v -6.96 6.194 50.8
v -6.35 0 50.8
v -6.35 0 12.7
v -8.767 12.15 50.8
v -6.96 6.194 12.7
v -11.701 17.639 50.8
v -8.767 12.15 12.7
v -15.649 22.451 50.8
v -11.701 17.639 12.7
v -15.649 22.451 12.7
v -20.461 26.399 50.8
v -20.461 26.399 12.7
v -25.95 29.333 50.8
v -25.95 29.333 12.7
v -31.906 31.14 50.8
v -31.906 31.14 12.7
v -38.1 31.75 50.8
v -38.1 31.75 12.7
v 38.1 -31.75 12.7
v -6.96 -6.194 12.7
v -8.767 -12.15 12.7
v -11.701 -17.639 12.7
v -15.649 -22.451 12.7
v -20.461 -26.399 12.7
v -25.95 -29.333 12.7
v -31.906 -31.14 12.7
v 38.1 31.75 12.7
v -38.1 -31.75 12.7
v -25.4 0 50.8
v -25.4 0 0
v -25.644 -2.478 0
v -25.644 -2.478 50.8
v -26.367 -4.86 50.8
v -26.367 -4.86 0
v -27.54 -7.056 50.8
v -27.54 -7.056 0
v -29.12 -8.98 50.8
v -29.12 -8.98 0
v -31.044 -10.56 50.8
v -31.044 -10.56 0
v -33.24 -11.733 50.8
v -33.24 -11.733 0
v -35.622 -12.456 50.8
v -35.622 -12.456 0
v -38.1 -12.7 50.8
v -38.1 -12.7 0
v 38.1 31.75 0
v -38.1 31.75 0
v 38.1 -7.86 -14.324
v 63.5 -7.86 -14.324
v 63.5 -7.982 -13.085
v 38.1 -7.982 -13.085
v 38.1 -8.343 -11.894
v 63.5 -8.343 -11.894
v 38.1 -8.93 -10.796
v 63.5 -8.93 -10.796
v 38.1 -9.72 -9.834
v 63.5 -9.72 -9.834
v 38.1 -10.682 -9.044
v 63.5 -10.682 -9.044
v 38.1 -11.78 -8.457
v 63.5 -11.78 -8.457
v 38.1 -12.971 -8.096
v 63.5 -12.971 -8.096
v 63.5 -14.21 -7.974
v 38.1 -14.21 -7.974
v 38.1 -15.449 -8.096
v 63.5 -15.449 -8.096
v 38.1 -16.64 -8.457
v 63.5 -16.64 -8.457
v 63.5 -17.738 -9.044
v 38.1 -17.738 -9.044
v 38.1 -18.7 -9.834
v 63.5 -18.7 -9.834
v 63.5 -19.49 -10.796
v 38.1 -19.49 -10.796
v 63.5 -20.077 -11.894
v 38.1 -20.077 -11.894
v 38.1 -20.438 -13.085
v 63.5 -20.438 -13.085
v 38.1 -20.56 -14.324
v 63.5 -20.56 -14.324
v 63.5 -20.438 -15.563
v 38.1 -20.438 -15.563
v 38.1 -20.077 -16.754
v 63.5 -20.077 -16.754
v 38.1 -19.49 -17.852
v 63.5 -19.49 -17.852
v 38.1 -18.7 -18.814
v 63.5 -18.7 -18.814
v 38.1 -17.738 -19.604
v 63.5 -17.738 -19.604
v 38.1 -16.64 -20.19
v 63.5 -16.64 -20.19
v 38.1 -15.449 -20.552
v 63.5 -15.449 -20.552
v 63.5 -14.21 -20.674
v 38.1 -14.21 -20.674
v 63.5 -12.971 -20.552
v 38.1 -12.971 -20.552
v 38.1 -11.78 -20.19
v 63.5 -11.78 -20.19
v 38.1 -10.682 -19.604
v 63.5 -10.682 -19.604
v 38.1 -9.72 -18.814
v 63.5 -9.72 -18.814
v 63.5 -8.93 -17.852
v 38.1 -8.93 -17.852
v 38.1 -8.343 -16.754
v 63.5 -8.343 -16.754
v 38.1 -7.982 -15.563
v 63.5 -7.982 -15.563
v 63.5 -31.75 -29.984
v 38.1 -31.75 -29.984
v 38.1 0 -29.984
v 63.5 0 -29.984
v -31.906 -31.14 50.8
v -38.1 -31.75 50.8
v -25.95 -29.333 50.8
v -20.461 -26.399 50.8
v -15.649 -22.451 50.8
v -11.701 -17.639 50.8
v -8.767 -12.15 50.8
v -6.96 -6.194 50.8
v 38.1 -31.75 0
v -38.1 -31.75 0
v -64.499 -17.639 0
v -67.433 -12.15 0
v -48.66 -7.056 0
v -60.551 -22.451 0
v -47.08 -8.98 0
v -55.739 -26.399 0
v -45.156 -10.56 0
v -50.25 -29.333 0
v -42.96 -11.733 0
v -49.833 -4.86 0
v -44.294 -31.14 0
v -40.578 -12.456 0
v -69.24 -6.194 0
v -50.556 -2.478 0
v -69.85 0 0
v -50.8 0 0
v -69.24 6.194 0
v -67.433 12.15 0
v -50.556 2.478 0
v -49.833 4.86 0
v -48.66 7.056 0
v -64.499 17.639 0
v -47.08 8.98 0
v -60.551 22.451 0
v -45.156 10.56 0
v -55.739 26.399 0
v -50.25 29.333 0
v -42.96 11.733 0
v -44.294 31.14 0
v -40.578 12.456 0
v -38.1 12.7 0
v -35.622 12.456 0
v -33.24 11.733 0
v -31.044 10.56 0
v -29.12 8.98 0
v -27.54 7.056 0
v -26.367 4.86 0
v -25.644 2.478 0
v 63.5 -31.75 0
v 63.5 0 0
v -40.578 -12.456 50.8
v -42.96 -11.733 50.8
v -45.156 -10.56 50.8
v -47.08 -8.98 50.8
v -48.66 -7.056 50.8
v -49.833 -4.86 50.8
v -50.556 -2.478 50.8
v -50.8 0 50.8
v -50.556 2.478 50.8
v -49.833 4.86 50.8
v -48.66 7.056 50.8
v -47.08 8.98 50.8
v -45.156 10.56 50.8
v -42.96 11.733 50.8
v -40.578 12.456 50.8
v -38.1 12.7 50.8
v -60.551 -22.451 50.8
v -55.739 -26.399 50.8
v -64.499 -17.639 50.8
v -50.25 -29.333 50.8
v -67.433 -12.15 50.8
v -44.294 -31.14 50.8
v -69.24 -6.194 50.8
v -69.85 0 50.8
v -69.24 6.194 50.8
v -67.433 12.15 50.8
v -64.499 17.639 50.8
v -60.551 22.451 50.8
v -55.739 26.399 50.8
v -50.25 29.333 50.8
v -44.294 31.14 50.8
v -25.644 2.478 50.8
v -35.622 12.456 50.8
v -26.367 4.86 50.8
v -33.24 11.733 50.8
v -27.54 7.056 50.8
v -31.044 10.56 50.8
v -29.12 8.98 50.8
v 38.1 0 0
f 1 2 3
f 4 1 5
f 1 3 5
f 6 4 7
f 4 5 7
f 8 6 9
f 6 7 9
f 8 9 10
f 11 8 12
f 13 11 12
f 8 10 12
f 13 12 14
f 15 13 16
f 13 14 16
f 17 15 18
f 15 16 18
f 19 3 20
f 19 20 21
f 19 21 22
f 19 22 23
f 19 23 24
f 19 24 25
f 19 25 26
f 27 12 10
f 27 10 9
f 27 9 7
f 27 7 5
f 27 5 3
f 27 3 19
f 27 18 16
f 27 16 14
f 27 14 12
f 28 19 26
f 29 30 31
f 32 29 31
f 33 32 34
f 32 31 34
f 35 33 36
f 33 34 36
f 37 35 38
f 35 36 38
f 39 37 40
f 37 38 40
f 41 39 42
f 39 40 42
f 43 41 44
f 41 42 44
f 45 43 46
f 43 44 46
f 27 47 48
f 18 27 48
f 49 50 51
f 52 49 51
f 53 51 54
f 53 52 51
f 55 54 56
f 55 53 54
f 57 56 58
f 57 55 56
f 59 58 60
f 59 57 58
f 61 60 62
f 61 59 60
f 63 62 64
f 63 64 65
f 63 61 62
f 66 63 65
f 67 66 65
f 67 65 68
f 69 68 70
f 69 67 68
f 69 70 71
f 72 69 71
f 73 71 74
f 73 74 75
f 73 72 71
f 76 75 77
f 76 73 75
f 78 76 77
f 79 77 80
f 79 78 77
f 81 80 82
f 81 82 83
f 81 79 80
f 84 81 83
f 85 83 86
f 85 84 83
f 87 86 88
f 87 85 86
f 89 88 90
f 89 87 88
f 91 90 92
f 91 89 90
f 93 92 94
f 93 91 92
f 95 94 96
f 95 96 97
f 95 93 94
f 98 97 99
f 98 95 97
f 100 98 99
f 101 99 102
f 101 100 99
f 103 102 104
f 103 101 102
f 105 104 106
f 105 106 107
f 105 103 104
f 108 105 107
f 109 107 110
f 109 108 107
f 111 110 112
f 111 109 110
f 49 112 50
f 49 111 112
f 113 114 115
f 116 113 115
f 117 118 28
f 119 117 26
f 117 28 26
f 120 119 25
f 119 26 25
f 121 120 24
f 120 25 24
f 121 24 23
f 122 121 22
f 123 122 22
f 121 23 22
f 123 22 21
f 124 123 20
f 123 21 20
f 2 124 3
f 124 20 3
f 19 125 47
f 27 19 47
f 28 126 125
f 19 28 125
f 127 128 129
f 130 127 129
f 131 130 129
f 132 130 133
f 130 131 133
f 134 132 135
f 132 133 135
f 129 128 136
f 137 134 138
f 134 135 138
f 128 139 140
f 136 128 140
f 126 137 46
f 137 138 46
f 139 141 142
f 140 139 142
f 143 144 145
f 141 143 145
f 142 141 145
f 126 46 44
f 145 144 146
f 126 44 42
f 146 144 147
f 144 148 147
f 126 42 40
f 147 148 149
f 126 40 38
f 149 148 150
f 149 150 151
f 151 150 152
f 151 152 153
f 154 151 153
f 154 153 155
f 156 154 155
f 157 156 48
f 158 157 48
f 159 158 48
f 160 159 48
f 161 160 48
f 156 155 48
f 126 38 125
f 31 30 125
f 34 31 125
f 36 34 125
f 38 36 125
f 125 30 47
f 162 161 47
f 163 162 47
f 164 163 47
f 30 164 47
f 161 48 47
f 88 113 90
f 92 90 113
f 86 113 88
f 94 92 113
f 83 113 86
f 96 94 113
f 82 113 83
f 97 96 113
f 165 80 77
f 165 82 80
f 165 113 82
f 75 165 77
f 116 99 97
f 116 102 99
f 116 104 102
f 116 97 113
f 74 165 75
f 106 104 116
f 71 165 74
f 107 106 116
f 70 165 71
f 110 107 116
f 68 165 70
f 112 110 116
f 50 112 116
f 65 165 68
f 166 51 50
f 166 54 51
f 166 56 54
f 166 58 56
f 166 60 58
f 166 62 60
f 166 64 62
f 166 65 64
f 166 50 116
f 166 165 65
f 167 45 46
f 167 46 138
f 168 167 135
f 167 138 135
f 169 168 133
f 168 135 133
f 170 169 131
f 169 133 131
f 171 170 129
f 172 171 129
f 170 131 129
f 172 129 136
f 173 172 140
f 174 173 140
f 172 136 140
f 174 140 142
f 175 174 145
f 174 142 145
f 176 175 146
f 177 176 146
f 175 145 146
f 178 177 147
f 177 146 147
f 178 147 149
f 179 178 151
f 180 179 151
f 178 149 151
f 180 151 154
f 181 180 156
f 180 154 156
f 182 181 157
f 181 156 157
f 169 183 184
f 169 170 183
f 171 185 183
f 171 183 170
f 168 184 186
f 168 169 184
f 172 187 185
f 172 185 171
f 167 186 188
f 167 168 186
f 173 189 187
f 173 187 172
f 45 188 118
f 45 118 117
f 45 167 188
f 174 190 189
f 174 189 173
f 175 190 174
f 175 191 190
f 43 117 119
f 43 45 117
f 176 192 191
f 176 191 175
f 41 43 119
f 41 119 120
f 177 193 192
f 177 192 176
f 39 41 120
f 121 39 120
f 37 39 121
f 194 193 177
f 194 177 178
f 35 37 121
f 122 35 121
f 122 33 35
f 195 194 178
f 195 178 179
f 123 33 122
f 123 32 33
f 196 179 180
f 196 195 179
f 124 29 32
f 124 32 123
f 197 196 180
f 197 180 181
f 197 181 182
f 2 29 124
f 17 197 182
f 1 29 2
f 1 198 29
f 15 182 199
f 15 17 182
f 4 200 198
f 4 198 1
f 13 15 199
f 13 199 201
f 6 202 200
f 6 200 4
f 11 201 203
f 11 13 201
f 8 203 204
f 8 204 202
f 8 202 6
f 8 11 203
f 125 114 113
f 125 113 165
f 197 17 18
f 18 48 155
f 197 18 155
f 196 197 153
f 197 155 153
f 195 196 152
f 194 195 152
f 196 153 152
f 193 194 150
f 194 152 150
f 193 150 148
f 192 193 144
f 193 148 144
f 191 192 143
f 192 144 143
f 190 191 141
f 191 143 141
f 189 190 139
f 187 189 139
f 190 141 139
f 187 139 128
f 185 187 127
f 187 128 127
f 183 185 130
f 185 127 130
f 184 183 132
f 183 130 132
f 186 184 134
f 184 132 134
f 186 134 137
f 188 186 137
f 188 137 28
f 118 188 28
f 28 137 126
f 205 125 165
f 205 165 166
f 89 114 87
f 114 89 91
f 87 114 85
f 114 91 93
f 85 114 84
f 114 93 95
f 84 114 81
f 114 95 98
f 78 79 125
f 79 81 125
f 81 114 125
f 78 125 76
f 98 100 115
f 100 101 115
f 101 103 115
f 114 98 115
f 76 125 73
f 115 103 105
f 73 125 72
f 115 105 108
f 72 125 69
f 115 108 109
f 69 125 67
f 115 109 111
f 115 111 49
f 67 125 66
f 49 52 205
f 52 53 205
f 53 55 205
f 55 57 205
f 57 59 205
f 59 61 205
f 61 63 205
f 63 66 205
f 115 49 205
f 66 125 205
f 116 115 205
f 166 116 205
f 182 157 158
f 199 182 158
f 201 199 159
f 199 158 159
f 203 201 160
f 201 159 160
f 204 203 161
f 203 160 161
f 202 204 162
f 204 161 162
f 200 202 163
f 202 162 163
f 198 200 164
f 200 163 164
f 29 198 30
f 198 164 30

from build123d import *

# Parameters (mm, degrees)
F1_DEPTH = 12.7
F2_DEPTH = 50.8
F3_DEPTH = 50.8
F4_W     = 31.75
F4_H     = 29.984429
F4_R     = 6.35
F5_DEPTH = 25.4


with BuildPart() as f1:
    # F0 (on Top) → F1 (new body)
    with BuildSketch(Plane.XY):
        with BuildLine():
            Line((38.1, 31.75), (-38.1, 31.75))
            ThreePointArc((-38.1, 31.75), (-15.64936, 22.45064), (-6.35, 0))
            ThreePointArc((-6.35, 0), (-15.64936, -22.45064), (-38.1, -31.75))
            Line((-38.1, -31.75), (38.1, -31.75))
            Line((38.1, -31.75), (38.1, 31.75))
        make_face()
        with BuildLine():
            Line((-38.1, 12.7), (-38.1, 31.75))
            ThreePointArc((-38.1, 31.75), (-69.85, 0), (-38.1, -31.75))
            Line((-38.1, -31.75), (-38.1, -12.7))
            ThreePointArc((-38.1, -12.7), (-50.8, 0), (-38.1, 12.7))
        make_face()
    extrude(amount=F1_DEPTH)

    # F0 (on Top) → F2 (join)
    with BuildSketch(Plane.XY):
        with BuildLine():
            ThreePointArc((-6.35, 0), (-15.64936, 22.45064), (-38.1, 31.75))
            Line((-38.1, 31.75), (-38.1, 12.7))
            ThreePointArc((-38.1, 12.7), (-29.119744, 8.980256), (-25.4, 0))
            ThreePointArc((-25.4, 0), (-29.119744, -8.980256), (-38.1, -12.7))
            Line((-38.1, -12.7), (-38.1, -31.75))
            ThreePointArc((-38.1, -31.75), (-15.64936, -22.45064), (-6.35, 0))
        make_face()
    extrude(amount=F2_DEPTH)

    # F0 (on Top) → F3 (join)
    with BuildSketch(Plane.XY):
        with BuildLine():
            Line((-38.1, 12.7), (-38.1, 31.75))
            ThreePointArc((-38.1, 31.75), (-69.85, 0), (-38.1, -31.75))
            Line((-38.1, -31.75), (-38.1, -12.7))
            ThreePointArc((-38.1, -12.7), (-50.8, 0), (-38.1, 12.7))
        make_face()
    extrude(amount=F3_DEPTH)


with BuildPart() as f5:
    # F4 (on face) → F5 (new body)
    with BuildSketch(Plane.YZ.offset(38.1)):
        with Locations((-15.875, -14.992214)):
            Rectangle(F4_W, F4_H)
        with Locations((-14.21007, -14.323762)):
            Circle(F4_R, mode=Mode.SUBTRACT)
    extrude(amount=F5_DEPTH)


solid = Compound([f1.part, f5.part])
